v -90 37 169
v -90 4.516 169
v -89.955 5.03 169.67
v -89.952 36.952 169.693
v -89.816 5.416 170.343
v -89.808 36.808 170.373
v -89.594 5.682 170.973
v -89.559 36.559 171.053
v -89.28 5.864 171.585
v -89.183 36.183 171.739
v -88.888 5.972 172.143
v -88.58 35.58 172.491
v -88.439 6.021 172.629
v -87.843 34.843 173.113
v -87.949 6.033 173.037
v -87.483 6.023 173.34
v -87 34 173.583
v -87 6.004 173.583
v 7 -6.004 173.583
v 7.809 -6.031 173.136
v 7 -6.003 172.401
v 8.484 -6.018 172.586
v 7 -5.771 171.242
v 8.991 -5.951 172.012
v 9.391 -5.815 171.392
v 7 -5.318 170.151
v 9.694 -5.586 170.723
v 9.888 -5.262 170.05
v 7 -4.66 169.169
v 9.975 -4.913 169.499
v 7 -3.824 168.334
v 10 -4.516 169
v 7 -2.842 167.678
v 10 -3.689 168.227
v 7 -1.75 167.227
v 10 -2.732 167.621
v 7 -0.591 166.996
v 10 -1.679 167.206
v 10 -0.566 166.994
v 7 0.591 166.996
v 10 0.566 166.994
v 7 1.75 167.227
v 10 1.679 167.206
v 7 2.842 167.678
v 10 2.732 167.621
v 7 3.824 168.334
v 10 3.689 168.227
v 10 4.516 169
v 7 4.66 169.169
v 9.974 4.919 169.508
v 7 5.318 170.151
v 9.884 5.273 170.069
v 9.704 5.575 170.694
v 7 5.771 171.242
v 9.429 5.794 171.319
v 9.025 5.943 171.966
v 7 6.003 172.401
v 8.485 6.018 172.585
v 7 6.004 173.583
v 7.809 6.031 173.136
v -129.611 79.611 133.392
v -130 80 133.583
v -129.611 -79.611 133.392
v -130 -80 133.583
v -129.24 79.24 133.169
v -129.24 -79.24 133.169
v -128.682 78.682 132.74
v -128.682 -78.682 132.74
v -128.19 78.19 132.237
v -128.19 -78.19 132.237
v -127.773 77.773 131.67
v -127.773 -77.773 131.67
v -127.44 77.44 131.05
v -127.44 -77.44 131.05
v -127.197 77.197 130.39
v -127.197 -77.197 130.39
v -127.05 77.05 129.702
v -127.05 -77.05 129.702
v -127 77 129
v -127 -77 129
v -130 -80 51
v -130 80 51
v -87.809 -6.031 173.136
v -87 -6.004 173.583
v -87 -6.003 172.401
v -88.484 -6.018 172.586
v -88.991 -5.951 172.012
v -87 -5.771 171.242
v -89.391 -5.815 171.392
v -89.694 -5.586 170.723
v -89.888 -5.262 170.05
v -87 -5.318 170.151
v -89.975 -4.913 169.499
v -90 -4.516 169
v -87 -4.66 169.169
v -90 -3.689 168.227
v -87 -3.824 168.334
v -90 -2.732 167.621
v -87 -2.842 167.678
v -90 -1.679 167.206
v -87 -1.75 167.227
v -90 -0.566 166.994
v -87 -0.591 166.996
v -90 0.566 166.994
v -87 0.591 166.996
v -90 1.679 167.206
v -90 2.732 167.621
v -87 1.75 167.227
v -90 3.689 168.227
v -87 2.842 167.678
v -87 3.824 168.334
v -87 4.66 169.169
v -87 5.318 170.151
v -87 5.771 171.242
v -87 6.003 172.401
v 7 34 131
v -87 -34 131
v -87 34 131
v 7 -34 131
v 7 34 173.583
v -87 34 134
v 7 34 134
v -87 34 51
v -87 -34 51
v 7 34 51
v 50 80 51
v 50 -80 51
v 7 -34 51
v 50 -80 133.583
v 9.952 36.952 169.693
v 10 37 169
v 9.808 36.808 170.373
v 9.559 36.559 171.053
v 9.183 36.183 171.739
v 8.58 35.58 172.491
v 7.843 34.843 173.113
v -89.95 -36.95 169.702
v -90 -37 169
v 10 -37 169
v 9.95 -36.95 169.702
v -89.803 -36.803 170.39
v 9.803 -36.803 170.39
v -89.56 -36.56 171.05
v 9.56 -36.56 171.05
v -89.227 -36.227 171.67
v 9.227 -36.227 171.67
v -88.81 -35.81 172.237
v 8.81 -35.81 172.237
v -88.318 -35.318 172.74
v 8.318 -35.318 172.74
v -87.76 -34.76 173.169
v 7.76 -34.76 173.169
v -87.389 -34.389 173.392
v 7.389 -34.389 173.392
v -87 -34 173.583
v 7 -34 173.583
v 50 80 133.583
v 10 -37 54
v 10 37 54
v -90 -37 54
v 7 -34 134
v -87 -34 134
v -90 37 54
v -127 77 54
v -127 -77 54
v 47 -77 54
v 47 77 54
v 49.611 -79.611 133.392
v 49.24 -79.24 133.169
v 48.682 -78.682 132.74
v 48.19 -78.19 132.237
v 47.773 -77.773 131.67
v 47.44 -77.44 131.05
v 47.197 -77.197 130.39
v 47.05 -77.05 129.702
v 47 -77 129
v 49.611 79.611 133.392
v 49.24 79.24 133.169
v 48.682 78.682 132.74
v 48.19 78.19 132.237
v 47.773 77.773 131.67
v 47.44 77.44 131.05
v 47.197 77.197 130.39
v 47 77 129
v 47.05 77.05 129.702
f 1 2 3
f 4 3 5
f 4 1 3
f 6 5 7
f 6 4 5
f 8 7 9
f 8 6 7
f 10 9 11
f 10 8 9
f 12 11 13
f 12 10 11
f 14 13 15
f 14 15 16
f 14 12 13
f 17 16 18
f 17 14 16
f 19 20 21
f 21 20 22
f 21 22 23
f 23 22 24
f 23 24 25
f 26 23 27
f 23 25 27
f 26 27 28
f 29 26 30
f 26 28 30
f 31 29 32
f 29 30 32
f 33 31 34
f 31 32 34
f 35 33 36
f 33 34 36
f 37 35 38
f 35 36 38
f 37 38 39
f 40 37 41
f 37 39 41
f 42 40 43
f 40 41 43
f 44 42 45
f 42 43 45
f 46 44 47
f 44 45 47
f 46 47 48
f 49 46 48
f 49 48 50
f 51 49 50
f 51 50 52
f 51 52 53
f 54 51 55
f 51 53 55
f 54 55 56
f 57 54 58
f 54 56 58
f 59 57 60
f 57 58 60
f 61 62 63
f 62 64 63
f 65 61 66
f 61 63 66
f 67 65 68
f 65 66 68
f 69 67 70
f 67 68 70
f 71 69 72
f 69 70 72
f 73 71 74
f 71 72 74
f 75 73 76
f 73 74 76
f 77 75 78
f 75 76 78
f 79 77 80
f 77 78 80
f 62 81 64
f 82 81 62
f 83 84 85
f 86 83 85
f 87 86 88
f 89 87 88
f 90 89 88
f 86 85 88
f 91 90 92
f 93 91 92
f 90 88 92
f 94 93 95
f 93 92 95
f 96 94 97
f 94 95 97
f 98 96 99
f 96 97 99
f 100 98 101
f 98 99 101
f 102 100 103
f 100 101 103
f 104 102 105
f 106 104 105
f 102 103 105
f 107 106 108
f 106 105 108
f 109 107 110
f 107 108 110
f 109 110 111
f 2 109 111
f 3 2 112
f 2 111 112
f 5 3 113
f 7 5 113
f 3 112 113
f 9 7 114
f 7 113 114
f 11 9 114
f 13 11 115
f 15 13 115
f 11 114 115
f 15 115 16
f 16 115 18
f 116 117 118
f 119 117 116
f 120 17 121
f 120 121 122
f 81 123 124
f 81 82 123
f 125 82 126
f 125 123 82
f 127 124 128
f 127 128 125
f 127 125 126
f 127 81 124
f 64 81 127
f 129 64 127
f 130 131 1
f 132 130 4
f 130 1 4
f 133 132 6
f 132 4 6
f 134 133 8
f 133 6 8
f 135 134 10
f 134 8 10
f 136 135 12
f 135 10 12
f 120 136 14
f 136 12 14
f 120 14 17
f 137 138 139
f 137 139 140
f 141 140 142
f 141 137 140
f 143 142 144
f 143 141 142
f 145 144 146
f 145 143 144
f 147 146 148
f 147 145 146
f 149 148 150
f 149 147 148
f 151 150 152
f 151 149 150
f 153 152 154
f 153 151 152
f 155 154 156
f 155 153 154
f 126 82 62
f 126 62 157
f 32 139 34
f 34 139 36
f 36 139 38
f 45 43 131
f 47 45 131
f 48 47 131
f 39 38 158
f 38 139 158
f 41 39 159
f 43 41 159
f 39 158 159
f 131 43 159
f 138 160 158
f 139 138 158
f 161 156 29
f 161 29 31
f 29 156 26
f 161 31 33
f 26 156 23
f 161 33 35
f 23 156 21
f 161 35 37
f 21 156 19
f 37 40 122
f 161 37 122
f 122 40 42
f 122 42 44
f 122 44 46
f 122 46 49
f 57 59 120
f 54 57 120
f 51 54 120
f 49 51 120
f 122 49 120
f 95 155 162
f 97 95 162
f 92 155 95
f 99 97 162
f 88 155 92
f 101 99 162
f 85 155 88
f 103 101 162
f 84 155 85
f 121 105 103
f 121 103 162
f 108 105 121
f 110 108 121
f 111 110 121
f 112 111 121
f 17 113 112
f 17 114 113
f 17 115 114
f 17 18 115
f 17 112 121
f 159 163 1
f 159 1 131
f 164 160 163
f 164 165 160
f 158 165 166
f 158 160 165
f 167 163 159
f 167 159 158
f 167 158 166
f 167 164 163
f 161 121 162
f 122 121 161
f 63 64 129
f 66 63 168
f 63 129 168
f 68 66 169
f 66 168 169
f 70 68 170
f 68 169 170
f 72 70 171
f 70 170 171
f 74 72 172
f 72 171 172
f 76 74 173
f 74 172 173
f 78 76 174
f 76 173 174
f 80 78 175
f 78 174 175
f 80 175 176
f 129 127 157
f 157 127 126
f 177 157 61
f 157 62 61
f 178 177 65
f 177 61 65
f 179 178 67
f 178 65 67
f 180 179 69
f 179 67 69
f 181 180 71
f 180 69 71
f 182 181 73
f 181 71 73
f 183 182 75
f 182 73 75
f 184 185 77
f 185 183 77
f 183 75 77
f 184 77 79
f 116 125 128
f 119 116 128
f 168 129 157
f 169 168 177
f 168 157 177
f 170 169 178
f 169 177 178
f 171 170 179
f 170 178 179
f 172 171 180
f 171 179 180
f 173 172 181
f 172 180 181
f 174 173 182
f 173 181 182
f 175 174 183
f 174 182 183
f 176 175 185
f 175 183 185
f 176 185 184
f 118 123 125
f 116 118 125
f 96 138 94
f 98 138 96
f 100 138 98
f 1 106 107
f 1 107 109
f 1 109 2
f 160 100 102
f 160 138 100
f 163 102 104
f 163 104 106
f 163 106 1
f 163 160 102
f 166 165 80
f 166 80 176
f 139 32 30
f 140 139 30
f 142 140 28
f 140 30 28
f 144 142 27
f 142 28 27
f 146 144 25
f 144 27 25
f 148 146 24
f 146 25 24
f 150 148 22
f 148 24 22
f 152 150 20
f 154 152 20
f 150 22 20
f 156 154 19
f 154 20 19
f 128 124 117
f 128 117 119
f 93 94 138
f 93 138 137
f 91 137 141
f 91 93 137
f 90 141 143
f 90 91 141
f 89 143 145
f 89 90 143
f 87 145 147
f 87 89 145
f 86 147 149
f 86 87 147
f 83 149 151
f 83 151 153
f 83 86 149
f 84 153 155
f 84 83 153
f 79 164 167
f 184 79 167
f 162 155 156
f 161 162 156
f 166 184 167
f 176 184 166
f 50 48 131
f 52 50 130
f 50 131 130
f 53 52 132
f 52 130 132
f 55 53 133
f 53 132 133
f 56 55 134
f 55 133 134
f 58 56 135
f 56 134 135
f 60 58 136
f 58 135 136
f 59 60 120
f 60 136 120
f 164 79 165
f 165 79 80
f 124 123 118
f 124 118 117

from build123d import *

# Parameters (mm, degrees)
F0_W          = 180
F0_H          = 160
F1_DEPTH      = 1
F2_W          = 10
F2_H          = 10
F3_DEPTH      = 50
F4_T          = 1
F4_T3_DEPTH   = 12
F4_T5_DEPTH   = 12
F4_T7_DEPTH   = 12
F4_T9_DEPTH   = 12
F5_W          = 180
F5_H          = 160
F6_DEPTH      = 3
F7_W          = 180
F7_H          = 160
F7_W_2        = 174
F7_H_2        = 154
F8_DEPTH      = 80
F9_W          = 100
F9_H          = 74
F10_DEPTH     = 120
F11_W         = 94
F11_H         = 68
F12_DEPTH     = 40
F14_T1_DEPTH  = 125
F14_T3_DEPTH  = 99
F14_T5_DEPTH  = 174
F14_T7_DEPTH  = 154
F14_T13_DEPTH = 166.5
F14_T19_DEPTH = 186.5
F14_T28_DEPTH = 166.5
F14_T34_DEPTH = 186.5
F14_T43_DEPTH = 186.5
F14_T49_DEPTH = 166.5
F14_T58_DEPTH = 166.5
F14_T64_DEPTH = 186.5
F15_R         = 6.0326848408
F16_DEPTH     = 500
F17_W         = 180
F17_H         = 160
F18_DEPTH     = 51
F13_W         = 94
F13_H         = 68
F19_DEPTH     = 80


# Not quite as in the source:
# - a fillet or chamfer that OpenCascade refuses, or shapes differently, is made with other operations: its cross-section is extruded or revolved along the edge and cut away or added
# - a shell that OpenCascade refuses in one call is made with other operations: the cavity is built on its own and cut out


with BuildPart() as f1:
    # F0 (on Top) → F1 (new body)
    with BuildSketch(Plane.XY):
        with Locations((-40, 0)):
            Rectangle(F0_W, F0_H)
    extrude(amount=F1_DEPTH)

    # F2 (on face) → F3 (join)
    with BuildSketch(Plane.XY.offset(1)):
        with Locations((-125, 75)):
            Rectangle(F2_W, F2_H)
        with Locations((45, 75)):
            Rectangle(F2_W, F2_H)
        with Locations((-125, -75)):
            Rectangle(F2_W, F2_H)
        with Locations((45, -75)):
            Rectangle(F2_W, F2_H)
    extrude(amount=F3_DEPTH)

    # F4: shell of thickness 1, made by hand


with BuildPart() as f4_core1:
    # F4_t2: copy of F1
    add(f1.part)

    # the walls: a layer under each face that stays
    f4_faces = [f4_core1.faces().sort_by_distance(p)[0] for p in [
        (44, 80, 49.3),
        (-124, -80, 49.3),
        (45, -75, 51),
        (45, -70, 26),
        (40, -75, 26),
        (-120, -75, 26),
        (-125, -70, 26),
        (-125, -75, 51),
        (-130, 74.6666666667, 49.3),
        (-125, 70, 26),
        (-125, 75, 51),
        (-120, 75, 26),
        (-40, 0, 1),
        (45, 70, 26),
        (40, 75, 26),
        (45, 75, 51),
        (50, -74.6666666667, 49.3),
    ]]
    thicken(f4_faces, amount=-F4_T, mode=Mode.SUBTRACT)

    # F4_s4 → F4_t3 (cut)
    with BuildSketch(Plane.YZ.offset(39)):
        Polygon((-69.99, 1.01), (-71, 1), (-71, 0), (-70, 0), align=None)
        Polygon((69.99, 1.01), (70, 0), (71, 0), (71, 1), align=None)
    extrude(amount=F4_T3_DEPTH, mode=Mode.SUBTRACT)

    # F4_s6 → F4_t5 (cut)
    with BuildSketch(Plane.XZ.offset(69)):
        Polygon((39.99, 1.01), (41, 1), (41, 0), (40, 0), align=None)
        Polygon((-119.99, 1.01), (-121, 1), (-121, 0), (-120, 0), align=None)
    extrude(amount=F4_T5_DEPTH, mode=Mode.SUBTRACT)

    # F4_s8 → F4_t7 (cut)
    with BuildSketch(Plane.YZ.offset(-131)):
        Polygon((-69.99, 1.01), (-71, 1), (-71, 0), (-70, 0), align=None)
        Polygon((69.99, 1.01), (71, 1), (71, 0), (70, 0), align=None)
    extrude(amount=F4_T7_DEPTH, mode=Mode.SUBTRACT)

    # F4_s10 → F4_t9 (cut)
    with BuildSketch(Plane.XZ.offset(-81)):
        Polygon((-119.99, 1.01), (-121, 1), (-121, 0), (-120, 0), align=None)
        Polygon((39.99, 1.01), (40, 0), (41, 0), (41, 1), align=None)
    extrude(amount=F4_T9_DEPTH, mode=Mode.SUBTRACT)


with BuildPart() as f1_1:
    add(f1.part)

    # what is left inside the walls is the cavity
    f4_cavity = [f4_core1.part.solids().sort_by_distance(p)[0] for p in [
        (45, 78.99, 33.333333),
        (-125, 78.99, 33.333333),
        (48.99, -75, 33.333333),
        (-123.666667, -71.01, 25),
    ]]
    add(f4_cavity, mode=Mode.SUBTRACT)

    # F5 (on face) → F6 (join)
    with BuildSketch(Plane.XY.offset(51)):
        with Locations((-40, 0)):
            Rectangle(F5_W, F5_H)
    extrude(amount=F6_DEPTH)

    # F7 (on face) → F8 (join)
    with BuildSketch(Plane.XY.offset(54)):
        with Locations((-40, 0)):
            Rectangle(F7_W, F7_H)
        with Locations((-40, 0)):
            Rectangle(F7_W_2, F7_H_2, mode=Mode.SUBTRACT)
    extrude(amount=F8_DEPTH)

    # F9 (on face) → F10 (join)
    with BuildSketch(Plane.XY.offset(54)):
        with Locations((-40, 0)):
            Rectangle(F9_W, F9_H)
    extrude(amount=F10_DEPTH)

    # F11 (on face) → F12 (cut)
    with BuildSketch(Plane.XY.offset(174)):
        with Locations((-40, 0)):
            Rectangle(F11_W, F11_H)
    extrude(amount=-F12_DEPTH, mode=Mode.SUBTRACT)

    # F14: fillet of radius 5 on 8 edges, made by hand

    # F14_s2 → F14_t1 (cut)
    with BuildSketch(Plane.YZ.offset(-102.5)):
        with BuildLine():
            ThreePointArc((-37, 169), (-35.5355339059, 172.5355339059), (-32, 174))
            Line((-32, 174), (-37, 174))
            Line((-37, 174), (-37, 169))
        make_face()
        with BuildLine():
            ThreePointArc((37, 169), (35.5355339059, 172.5355339059), (32, 174))
            Line((32, 174), (37, 174))
            Line((37, 174), (37, 169))
        make_face()
    extrude(amount=F14_T1_DEPTH, mode=Mode.SUBTRACT)

    # F14_s4 → F14_t3 (cut)
    with BuildSketch(Plane.XZ.offset(-49.5)):
        with BuildLine():
            ThreePointArc((-90, 169), (-88.5355339059, 172.5355339059), (-85, 174))
            Line((-85, 174), (-90, 174))
            Line((-90, 174), (-90, 169))
        make_face()
        with BuildLine():
            ThreePointArc((10, 169), (8.5355339059, 172.5355339059), (5, 174))
            Line((5, 174), (10, 174))
            Line((10, 174), (10, 169))
        make_face()
    extrude(amount=F14_T3_DEPTH, mode=Mode.SUBTRACT)

    # F14_s6 → F14_t5 (cut)
    with BuildSketch(Plane.YZ.offset(-127)):
        with BuildLine():
            ThreePointArc((-82, 134), (-78.4644660941, 132.5355339059), (-77, 129))
            Line((-77, 129), (-77, 134))
            Line((-77, 134), (-82, 134))
        make_face()
        with BuildLine():
            ThreePointArc((82, 134), (78.4644660941, 132.5355339059), (77, 129))
            Line((77, 129), (77, 134))
            Line((77, 134), (82, 134))
        make_face()
    extrude(amount=F14_T5_DEPTH, mode=Mode.SUBTRACT)

    # F14_s8 → F14_t7 (cut)
    with BuildSketch(Plane.XZ.offset(-77)):
        with BuildLine():
            ThreePointArc((52, 134), (48.4644660941, 132.5355339059), (47, 129))
            Line((47, 129), (47, 134))
            Line((47, 134), (52, 134))
        make_face()
        with BuildLine():
            ThreePointArc((-132, 134), (-128.4644660941, 132.5355339059), (-127, 129))
            Line((-127, 129), (-127, 134))
            Line((-127, 134), (-132, 134))
        make_face()
    extrude(amount=F14_T7_DEPTH, mode=Mode.SUBTRACT)


with BuildPart() as f14_tool11:
    # F14_s12 → F14_t13 (new body)
    with BuildSketch(Plane.XZ.offset(-77)):
        with BuildLine():
            ThreePointArc((52, 134), (48.4644660941, 132.5355339059), (47, 129))
            Line((47, 129), (47, 134))
            Line((47, 134), (52, 134))
        make_face()
    extrude(amount=F14_T13_DEPTH)

    split(bisect_by=Plane.YZ.offset(50), keep=Keep.BOTTOM)

    split(bisect_by=Plane.XZ.offset(80), keep=Keep.BOTTOM)

    split(bisect_by=Plane.XZ.offset(77), keep=Keep.TOP)


with BuildPart() as f14_tool17:
    # F14_s18 → F14_t19 (new body)
    with BuildSketch(Plane.YZ.offset(59.5)):
        with BuildLine():
            ThreePointArc((-82, 134), (-78.4644660941, 132.5355339059), (-77, 129))
            Line((-77, 129), (-77, 134))
            Line((-77, 134), (-82, 134))
        make_face()
    extrude(amount=-F14_T19_DEPTH)

    split(bisect_by=Plane.YZ.offset(50), keep=Keep.BOTTOM)

    split(bisect_by=Plane.XZ.offset(80), keep=Keep.BOTTOM)

    split(bisect_by=Plane.YZ.offset(47), keep=Keep.TOP)


with BuildPart() as f14_tool11_1:
    add(f14_tool11.part)

    # F14_t23: intersect F14_tool17
    add(f14_tool17.part, mode=Mode.INTERSECT)


with BuildPart() as f1_2:
    add(f1_1.part)

    # F14_t9: cut F14_tool11
    add(f14_tool11_1.part, mode=Mode.SUBTRACT)


with BuildPart() as f14_tool26:
    # F14_s27 → F14_t28 (new body)
    with BuildSketch(Plane.XZ.offset(89.5)):
        with BuildLine():
            ThreePointArc((-132, 134), (-128.4644660941, 132.5355339059), (-127, 129))
            Line((-127, 129), (-127, 134))
            Line((-127, 134), (-132, 134))
        make_face()
    extrude(amount=-F14_T28_DEPTH)

    split(bisect_by=Plane.YZ.offset(-130), keep=Keep.TOP)

    split(bisect_by=Plane.XZ.offset(80), keep=Keep.BOTTOM)

    split(bisect_by=Plane.XZ.offset(77), keep=Keep.TOP)


with BuildPart() as f14_tool32:
    # F14_s33 → F14_t34 (new body)
    with BuildSketch(Plane.YZ.offset(47)):
        with BuildLine():
            ThreePointArc((-82, 134), (-78.4644660941, 132.5355339059), (-77, 129))
            Line((-77, 129), (-77, 134))
            Line((-77, 134), (-82, 134))
        make_face()
    extrude(amount=-F14_T34_DEPTH)

    split(bisect_by=Plane.YZ.offset(-130), keep=Keep.TOP)

    split(bisect_by=Plane.XZ.offset(80), keep=Keep.BOTTOM)

    split(bisect_by=Plane.YZ.offset(-127), keep=Keep.BOTTOM)


with BuildPart() as f14_tool26_1:
    add(f14_tool26.part)

    # F14_t38: intersect F14_tool32
    add(f14_tool32.part, mode=Mode.INTERSECT)


with BuildPart() as f1_3:
    add(f1_2.part)

    # F14_t24: cut F14_tool26
    add(f14_tool26_1.part, mode=Mode.SUBTRACT)


with BuildPart() as f14_tool41:
    # F14_s42 → F14_t43 (new body)
    with BuildSketch(Plane.YZ.offset(-127)):
        with BuildLine():
            ThreePointArc((82, 134), (78.4644660941, 132.5355339059), (77, 129))
            Line((77, 129), (77, 134))
            Line((77, 134), (82, 134))
        make_face()
    extrude(amount=F14_T43_DEPTH)

    split(bisect_by=Plane.XZ.offset(-80), keep=Keep.TOP)

    split(bisect_by=Plane.YZ.offset(50), keep=Keep.BOTTOM)

    split(bisect_by=Plane.YZ.offset(47), keep=Keep.TOP)


with BuildPart() as f14_tool47:
    # F14_s48 → F14_t49 (new body)
    with BuildSketch(Plane.XZ.offset(-89.5)):
        with BuildLine():
            ThreePointArc((52, 134), (48.4644660941, 132.5355339059), (47, 129))
            Line((47, 129), (47, 134))
            Line((47, 134), (52, 134))
        make_face()
    extrude(amount=F14_T49_DEPTH)

    split(bisect_by=Plane.XZ.offset(-80), keep=Keep.TOP)

    split(bisect_by=Plane.YZ.offset(50), keep=Keep.BOTTOM)

    split(bisect_by=Plane.XZ.offset(-77), keep=Keep.BOTTOM)


with BuildPart() as f14_tool41_1:
    add(f14_tool41.part)

    # F14_t53: intersect F14_tool47
    add(f14_tool47.part, mode=Mode.INTERSECT)


with BuildPart() as f1_4:
    add(f1_3.part)

    # F14_t39: cut F14_tool41
    add(f14_tool41_1.part, mode=Mode.SUBTRACT)


with BuildPart() as f14_tool56:
    # F14_s57 → F14_t58 (new body)
    with BuildSketch(Plane.XZ.offset(77)):
        with BuildLine():
            ThreePointArc((-132, 134), (-128.4644660941, 132.5355339059), (-127, 129))
            Line((-127, 129), (-127, 134))
            Line((-127, 134), (-132, 134))
        make_face()
    extrude(amount=-F14_T58_DEPTH)

    split(bisect_by=Plane.XZ.offset(-80), keep=Keep.TOP)

    split(bisect_by=Plane.YZ.offset(-130), keep=Keep.TOP)

    split(bisect_by=Plane.XZ.offset(-77), keep=Keep.BOTTOM)


with BuildPart() as f14_tool62:
    # F14_s63 → F14_t64 (new body)
    with BuildSketch(Plane.YZ.offset(-139.5)):
        with BuildLine():
            ThreePointArc((82, 134), (78.4644660941, 132.5355339059), (77, 129))
            Line((77, 129), (77, 134))
            Line((77, 134), (82, 134))
        make_face()
    extrude(amount=F14_T64_DEPTH)

    split(bisect_by=Plane.XZ.offset(-80), keep=Keep.TOP)

    split(bisect_by=Plane.YZ.offset(-130), keep=Keep.TOP)

    split(bisect_by=Plane.YZ.offset(-127), keep=Keep.BOTTOM)


with BuildPart() as f14_tool56_1:
    add(f14_tool56.part)

    # F14_t68: intersect F14_tool62
    add(f14_tool62.part, mode=Mode.INTERSECT)


with BuildPart() as f1_5:
    add(f1_4.part)

    # F14_t54: cut F14_tool56
    add(f14_tool56_1.part, mode=Mode.SUBTRACT)

    # F15 (on face) → F16 (cut)
    with BuildSketch(Plane.YZ.offset(10)):
        with Locations((0, 173)):
            Circle(F15_R)
    extrude(amount=-F16_DEPTH, mode=Mode.SUBTRACT)

    # F17 (on face) → F18 (cut)
    with BuildSketch(Plane(origin=(0, 0, 0), x_dir=(1, 0, 0), z_dir=(0, 0, -1))):
        with Locations((-40, 0)):
            Rectangle(F17_W, F17_H)
    extrude(amount=-F18_DEPTH, mode=Mode.SUBTRACT)

    # F13 (on face) → F19 (cut)
    with BuildSketch(Plane(origin=(0, 0, 51), x_dir=(1, 0, 0), z_dir=(0, 0, -1))):
        with Locations((-40, 0)):
            Rectangle(F13_W, F13_H)
    extrude(amount=-F19_DEPTH, mode=Mode.SUBTRACT)


solid = f1_5.part
